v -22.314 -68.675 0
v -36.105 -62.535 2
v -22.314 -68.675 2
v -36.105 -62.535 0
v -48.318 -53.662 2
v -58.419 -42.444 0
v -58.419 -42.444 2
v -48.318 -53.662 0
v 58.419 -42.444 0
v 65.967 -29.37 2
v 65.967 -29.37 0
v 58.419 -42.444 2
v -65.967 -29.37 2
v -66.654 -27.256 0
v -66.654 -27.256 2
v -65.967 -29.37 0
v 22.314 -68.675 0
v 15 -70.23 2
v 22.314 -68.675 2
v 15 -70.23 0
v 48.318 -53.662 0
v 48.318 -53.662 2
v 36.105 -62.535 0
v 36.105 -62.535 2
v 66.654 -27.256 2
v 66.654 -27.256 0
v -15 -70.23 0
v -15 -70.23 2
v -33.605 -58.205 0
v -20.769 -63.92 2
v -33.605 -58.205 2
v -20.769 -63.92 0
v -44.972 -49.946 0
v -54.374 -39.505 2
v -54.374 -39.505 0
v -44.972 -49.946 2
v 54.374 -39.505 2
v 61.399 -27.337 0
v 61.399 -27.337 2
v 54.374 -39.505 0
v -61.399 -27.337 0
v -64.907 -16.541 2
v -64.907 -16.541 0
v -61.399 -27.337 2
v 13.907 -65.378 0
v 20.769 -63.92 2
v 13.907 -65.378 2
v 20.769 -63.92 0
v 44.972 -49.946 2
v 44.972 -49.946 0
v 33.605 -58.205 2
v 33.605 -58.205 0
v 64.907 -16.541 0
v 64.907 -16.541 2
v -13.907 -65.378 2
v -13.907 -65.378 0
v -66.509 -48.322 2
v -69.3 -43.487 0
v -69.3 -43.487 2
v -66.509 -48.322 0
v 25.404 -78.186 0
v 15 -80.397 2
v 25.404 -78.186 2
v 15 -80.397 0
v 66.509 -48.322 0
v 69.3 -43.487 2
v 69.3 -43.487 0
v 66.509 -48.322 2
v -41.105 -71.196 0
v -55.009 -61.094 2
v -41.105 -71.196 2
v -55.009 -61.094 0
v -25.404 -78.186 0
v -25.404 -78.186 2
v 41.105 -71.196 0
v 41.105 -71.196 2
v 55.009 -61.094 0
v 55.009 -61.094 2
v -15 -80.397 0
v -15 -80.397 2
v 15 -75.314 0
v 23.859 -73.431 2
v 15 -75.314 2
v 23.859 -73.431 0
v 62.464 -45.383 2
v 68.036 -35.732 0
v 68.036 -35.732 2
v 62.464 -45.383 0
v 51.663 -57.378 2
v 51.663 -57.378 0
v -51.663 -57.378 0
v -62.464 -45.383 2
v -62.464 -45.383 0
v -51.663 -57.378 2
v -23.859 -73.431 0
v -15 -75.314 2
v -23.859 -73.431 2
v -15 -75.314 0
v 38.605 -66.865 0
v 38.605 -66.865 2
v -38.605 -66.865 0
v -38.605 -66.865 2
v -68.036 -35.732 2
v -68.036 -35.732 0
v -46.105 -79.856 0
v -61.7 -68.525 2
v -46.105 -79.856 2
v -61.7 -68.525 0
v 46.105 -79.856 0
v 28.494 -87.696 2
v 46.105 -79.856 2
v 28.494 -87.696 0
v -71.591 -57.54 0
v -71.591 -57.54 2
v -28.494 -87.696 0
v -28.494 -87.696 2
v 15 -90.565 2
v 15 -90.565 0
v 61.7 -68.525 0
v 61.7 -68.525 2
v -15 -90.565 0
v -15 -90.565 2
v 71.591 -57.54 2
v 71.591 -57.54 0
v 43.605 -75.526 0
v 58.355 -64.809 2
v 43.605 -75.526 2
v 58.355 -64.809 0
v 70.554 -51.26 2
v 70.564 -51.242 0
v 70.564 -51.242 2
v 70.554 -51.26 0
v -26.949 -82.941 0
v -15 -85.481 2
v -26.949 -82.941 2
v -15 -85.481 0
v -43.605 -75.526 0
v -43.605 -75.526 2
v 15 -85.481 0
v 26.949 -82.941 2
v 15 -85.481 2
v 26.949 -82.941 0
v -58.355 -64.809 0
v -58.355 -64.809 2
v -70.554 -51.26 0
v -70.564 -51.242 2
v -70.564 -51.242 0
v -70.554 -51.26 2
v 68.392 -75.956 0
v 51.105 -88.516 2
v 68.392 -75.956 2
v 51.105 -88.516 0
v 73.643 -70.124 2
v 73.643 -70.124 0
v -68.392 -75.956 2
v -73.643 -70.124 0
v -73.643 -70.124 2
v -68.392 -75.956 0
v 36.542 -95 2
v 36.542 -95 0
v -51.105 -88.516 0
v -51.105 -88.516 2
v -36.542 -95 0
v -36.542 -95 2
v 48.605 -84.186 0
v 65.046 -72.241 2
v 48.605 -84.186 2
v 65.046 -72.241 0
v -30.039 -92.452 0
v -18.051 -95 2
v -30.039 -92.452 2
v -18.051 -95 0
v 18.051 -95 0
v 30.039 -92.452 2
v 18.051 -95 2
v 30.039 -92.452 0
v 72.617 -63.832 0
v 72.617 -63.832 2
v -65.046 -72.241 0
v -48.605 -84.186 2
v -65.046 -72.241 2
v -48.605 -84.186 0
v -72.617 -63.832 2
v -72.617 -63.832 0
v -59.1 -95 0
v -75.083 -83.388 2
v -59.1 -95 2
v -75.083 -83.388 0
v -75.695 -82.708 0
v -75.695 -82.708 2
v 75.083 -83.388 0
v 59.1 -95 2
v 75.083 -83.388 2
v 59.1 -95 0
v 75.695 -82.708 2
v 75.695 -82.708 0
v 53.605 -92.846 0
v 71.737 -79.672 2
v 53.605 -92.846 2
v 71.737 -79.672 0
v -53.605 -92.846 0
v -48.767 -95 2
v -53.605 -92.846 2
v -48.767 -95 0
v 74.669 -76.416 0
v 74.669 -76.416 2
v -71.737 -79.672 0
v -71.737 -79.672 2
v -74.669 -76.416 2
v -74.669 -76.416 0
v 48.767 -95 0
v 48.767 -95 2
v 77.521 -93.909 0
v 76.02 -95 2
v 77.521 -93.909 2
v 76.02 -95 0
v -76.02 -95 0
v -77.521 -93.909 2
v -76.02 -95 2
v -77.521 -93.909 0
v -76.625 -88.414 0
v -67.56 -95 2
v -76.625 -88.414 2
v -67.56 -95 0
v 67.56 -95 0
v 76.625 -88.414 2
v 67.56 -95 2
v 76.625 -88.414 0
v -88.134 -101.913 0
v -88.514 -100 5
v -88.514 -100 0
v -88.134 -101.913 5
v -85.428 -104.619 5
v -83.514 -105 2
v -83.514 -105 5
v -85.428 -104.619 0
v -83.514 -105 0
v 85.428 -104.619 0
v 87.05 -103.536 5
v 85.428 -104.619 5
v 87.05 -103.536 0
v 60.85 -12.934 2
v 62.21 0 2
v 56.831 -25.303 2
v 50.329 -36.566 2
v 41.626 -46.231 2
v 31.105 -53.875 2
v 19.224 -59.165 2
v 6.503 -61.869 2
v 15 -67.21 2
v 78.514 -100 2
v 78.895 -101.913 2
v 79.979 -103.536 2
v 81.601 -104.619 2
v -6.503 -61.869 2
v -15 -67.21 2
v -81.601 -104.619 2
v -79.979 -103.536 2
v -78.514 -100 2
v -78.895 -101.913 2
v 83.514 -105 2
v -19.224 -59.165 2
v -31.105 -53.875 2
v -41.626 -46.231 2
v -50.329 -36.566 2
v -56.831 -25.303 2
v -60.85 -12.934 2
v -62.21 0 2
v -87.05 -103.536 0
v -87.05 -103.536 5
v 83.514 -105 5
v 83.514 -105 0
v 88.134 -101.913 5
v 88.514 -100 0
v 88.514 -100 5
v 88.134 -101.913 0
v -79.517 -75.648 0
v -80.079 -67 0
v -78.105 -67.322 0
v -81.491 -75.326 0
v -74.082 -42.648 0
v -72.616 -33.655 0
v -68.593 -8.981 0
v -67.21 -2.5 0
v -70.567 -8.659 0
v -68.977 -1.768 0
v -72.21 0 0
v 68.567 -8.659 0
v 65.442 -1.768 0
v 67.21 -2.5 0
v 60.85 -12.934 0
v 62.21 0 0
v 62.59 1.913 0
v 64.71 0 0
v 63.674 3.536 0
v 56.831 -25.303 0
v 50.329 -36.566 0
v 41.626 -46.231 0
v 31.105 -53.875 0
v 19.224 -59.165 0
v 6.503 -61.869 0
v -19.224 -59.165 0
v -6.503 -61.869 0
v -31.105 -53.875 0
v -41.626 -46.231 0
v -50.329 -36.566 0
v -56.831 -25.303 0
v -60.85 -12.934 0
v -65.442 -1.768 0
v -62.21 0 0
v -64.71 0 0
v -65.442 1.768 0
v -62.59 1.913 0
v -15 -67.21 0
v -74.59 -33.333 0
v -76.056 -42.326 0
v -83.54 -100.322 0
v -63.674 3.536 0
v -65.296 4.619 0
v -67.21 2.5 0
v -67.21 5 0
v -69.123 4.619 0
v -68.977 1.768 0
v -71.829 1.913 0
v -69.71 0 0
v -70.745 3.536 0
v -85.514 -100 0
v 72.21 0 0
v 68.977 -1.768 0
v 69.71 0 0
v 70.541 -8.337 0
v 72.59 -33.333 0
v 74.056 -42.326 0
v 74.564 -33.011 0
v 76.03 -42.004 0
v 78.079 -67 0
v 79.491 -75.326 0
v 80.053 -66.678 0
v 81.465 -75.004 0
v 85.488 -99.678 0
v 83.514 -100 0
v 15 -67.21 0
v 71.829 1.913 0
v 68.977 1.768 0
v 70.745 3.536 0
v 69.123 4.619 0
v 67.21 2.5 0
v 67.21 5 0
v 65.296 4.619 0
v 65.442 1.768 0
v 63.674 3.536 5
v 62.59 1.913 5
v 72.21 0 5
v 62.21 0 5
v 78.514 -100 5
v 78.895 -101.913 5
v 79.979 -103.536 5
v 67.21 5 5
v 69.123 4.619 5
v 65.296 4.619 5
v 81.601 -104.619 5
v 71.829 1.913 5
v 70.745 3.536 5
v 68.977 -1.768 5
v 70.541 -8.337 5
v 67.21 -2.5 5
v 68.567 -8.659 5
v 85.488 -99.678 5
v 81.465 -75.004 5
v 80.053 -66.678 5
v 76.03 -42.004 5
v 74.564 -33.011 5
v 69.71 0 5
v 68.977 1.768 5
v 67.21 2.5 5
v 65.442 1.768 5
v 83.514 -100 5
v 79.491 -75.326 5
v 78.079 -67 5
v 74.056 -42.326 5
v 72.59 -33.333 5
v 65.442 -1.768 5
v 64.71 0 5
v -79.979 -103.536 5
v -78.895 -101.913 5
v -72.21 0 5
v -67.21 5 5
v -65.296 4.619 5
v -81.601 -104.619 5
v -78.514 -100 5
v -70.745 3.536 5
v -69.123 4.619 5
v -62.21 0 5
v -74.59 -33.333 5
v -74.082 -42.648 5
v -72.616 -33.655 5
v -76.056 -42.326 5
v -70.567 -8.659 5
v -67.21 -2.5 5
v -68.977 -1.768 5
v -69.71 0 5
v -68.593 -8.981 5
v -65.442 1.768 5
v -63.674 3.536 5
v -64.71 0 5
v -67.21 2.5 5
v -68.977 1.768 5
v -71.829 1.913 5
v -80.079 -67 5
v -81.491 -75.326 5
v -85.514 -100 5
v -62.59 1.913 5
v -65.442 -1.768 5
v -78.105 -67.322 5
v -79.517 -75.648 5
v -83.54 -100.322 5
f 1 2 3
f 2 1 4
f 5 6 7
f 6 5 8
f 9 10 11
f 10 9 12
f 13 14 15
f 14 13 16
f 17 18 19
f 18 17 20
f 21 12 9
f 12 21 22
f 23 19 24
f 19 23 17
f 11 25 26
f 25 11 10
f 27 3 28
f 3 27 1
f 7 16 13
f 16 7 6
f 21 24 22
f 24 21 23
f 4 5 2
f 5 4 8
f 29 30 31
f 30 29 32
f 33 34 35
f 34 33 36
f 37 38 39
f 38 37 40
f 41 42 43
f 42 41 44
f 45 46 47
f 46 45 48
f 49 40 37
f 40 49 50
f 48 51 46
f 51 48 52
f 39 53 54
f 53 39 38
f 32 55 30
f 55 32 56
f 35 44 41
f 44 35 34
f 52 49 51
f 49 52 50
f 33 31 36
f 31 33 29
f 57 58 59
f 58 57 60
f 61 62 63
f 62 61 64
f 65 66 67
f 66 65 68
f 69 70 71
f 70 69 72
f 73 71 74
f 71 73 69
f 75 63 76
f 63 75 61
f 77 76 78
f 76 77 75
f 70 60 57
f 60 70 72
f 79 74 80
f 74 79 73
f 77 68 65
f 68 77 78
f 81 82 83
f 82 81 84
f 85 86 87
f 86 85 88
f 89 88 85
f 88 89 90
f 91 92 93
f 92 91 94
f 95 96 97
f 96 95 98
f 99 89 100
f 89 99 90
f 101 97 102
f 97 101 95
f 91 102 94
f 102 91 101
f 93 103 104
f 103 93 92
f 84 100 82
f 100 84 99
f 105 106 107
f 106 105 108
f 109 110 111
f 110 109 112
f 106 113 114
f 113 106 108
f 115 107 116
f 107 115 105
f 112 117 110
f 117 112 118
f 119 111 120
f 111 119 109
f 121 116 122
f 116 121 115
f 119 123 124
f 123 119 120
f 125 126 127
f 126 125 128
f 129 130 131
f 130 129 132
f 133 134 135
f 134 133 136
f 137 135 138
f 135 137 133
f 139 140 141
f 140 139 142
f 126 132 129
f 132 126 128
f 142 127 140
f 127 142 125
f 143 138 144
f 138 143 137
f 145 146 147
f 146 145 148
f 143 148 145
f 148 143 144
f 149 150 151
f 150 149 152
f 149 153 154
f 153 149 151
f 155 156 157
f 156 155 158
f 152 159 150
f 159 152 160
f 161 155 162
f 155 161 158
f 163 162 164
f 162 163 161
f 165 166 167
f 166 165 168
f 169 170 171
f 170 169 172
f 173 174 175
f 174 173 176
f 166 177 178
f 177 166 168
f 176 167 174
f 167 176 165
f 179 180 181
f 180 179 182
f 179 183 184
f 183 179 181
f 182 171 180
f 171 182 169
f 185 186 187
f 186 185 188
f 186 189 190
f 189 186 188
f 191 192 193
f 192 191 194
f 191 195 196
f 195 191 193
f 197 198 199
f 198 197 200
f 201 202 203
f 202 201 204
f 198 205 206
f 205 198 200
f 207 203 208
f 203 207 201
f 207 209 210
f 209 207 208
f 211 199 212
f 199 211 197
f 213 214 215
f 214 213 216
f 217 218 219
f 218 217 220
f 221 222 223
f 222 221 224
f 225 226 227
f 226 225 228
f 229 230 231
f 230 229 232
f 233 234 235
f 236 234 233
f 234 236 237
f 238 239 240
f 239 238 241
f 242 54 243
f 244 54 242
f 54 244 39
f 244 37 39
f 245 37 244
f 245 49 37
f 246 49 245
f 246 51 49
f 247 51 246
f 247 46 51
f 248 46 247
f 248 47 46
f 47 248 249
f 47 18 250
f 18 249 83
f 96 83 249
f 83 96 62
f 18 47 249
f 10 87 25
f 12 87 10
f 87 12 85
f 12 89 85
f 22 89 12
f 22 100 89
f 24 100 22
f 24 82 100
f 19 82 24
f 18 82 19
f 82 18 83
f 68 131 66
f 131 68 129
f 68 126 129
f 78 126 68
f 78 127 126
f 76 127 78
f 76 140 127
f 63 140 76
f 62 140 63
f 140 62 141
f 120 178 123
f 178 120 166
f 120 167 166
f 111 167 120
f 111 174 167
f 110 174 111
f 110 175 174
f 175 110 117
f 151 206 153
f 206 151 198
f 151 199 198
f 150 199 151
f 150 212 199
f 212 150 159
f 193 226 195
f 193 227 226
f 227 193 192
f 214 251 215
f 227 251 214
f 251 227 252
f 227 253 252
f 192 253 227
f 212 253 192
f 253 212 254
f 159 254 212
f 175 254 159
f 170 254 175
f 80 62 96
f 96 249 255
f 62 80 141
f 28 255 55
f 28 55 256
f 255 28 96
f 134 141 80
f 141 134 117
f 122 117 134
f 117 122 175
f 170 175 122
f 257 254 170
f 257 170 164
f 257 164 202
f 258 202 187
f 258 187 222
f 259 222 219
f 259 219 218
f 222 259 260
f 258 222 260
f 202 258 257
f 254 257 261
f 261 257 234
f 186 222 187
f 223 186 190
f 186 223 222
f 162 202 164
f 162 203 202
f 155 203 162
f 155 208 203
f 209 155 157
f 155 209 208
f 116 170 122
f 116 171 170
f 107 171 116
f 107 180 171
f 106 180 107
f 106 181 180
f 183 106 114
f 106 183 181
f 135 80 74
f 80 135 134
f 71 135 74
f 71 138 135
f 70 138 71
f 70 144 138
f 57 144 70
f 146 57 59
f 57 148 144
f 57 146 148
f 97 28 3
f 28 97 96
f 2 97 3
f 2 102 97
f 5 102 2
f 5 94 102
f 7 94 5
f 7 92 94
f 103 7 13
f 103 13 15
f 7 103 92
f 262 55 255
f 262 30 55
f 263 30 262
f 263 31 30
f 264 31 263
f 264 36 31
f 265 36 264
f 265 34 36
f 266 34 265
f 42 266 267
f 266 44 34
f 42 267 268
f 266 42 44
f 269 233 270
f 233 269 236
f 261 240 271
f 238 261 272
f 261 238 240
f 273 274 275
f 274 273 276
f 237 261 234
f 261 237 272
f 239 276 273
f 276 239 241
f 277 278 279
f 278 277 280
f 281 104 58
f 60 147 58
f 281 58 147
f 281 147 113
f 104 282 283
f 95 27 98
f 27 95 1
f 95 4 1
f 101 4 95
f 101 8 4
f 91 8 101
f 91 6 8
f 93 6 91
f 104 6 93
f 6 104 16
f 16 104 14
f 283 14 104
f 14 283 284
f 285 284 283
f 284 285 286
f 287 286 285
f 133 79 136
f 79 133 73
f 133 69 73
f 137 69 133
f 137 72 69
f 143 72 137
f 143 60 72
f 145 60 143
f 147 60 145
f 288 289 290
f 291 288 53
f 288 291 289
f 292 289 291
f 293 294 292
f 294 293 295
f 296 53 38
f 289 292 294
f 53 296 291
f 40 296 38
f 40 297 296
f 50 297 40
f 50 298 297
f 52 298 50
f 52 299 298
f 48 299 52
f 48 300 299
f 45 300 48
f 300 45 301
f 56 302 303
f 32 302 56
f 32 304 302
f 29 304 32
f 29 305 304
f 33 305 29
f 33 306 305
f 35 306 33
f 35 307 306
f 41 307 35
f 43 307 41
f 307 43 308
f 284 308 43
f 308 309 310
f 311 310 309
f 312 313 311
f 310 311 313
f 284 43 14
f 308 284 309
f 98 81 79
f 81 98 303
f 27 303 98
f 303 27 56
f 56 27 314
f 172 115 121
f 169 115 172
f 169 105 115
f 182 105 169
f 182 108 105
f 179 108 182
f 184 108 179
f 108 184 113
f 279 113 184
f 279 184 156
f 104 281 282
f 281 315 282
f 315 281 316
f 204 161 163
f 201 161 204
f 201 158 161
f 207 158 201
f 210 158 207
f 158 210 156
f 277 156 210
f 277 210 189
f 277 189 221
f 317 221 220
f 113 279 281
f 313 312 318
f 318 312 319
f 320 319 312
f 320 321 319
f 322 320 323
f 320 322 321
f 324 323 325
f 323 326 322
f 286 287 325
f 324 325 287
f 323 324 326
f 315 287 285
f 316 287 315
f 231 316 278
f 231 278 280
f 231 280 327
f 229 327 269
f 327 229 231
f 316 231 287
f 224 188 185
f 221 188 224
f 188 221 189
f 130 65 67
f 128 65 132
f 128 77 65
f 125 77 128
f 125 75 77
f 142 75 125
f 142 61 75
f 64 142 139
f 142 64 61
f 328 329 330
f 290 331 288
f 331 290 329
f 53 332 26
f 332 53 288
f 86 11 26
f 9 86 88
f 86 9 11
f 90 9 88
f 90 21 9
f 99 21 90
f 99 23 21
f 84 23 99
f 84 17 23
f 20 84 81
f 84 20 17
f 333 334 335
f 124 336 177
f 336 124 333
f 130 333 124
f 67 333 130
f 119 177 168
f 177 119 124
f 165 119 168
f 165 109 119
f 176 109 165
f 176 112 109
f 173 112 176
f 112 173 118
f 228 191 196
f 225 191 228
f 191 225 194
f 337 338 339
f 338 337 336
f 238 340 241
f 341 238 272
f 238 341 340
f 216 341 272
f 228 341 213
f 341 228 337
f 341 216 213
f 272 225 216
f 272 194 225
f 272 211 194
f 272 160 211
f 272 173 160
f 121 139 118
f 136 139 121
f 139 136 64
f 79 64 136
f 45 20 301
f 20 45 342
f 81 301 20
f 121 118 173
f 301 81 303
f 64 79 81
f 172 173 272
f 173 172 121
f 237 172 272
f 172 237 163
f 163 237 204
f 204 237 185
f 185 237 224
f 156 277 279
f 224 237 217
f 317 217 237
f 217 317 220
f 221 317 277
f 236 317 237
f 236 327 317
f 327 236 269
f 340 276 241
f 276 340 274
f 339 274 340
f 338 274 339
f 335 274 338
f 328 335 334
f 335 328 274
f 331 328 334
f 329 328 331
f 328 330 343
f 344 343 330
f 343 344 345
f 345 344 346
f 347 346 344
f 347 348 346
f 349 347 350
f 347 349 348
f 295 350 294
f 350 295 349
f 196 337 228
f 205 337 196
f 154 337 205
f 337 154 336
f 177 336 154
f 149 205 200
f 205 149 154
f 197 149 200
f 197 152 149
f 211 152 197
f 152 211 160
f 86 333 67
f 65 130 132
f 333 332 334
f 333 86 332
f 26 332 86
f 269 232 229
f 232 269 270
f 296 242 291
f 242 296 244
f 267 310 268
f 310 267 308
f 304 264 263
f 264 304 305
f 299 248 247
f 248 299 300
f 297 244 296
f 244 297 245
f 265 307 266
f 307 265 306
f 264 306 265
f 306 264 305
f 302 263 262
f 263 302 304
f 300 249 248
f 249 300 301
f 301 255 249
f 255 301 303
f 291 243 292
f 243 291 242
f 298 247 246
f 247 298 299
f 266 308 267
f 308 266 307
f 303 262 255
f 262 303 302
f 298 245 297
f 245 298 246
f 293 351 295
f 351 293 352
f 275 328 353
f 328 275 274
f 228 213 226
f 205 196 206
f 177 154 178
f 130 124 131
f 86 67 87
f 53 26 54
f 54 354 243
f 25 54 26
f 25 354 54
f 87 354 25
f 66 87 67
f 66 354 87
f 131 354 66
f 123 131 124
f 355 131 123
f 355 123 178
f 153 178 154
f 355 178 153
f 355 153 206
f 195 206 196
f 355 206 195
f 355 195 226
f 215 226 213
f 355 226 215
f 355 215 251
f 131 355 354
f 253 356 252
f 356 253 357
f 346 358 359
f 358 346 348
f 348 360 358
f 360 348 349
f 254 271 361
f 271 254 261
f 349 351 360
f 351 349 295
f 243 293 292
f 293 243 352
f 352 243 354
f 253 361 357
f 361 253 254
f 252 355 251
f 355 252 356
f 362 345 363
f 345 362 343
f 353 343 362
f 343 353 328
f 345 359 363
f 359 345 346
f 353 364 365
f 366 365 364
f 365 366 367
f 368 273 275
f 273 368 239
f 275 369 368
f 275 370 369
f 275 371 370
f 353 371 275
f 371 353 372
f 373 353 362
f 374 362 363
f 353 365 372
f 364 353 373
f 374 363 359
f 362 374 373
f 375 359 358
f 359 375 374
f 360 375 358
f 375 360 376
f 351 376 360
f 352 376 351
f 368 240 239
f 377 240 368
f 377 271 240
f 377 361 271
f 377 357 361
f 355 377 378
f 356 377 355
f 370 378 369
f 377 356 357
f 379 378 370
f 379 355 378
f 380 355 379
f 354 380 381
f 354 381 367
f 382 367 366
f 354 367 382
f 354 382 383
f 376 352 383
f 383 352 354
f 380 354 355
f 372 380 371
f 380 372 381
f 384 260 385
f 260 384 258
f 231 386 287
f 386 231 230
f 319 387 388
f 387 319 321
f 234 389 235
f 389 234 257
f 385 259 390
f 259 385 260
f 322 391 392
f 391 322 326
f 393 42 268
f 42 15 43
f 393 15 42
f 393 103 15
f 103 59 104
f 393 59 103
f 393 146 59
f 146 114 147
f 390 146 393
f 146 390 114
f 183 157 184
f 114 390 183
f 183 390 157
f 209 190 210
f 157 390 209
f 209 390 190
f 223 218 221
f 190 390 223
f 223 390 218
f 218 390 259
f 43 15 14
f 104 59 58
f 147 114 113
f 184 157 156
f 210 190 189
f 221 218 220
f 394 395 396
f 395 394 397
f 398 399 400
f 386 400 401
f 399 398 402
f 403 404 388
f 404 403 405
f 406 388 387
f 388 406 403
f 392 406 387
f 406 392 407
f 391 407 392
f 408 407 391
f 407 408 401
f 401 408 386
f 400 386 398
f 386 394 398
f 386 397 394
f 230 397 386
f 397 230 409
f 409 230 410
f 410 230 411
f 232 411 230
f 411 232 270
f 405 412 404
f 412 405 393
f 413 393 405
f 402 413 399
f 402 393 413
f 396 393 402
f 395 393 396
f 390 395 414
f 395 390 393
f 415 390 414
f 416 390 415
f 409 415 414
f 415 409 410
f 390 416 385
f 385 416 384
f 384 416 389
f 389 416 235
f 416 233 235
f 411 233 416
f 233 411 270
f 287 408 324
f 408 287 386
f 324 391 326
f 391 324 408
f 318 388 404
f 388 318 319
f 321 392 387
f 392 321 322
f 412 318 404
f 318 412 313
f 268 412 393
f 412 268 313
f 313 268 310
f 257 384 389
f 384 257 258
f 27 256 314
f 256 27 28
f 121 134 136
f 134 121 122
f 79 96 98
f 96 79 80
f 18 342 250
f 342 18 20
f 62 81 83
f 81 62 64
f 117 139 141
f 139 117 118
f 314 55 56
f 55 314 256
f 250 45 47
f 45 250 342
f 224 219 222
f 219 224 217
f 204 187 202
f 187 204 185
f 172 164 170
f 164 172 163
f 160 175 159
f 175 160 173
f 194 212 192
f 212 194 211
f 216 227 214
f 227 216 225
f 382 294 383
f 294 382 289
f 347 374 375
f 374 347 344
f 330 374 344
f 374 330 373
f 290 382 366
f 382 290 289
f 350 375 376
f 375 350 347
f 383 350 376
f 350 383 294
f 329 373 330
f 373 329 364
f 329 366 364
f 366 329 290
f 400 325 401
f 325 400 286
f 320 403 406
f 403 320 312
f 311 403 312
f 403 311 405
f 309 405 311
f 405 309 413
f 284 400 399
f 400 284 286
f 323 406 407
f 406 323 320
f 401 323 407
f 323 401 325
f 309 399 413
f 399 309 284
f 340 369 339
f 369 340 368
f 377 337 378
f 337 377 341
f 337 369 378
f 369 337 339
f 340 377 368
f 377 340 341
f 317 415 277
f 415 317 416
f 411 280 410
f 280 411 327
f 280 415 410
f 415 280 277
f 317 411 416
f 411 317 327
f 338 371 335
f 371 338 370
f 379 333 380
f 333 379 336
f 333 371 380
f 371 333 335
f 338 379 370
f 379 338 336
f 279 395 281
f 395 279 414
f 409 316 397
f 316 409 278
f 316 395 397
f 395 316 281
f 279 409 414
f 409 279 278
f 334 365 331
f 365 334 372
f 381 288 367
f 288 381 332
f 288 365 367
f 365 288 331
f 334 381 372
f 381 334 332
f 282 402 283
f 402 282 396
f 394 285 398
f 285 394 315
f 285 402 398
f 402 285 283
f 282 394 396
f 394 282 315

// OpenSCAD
/* [Measurements] */
// See Measurement Guide at:
// https://docs.google.com/a/popk.in/document/d/1LX3tBpio-6IsMMo3aaUdR-mLwWdv1jS4ooeEHb79JYo for details.
// The default values are the ones from the photo in that document.

// e-NABLE measurement 5, Wrist Joint distance from lateral to medial side
wrist = 35.97;
// Length of gauntlet, e.g. half distance from elbow to wrist.
len = 100;
// Distance between lateral and medial side of the middle forearm (end of gauntlet closest to elbow)
width = 46.35;
// height of side rail
rail = 10; 
// thickness of side rails
thick=5; 
// thickness of rest of gauntlet
thin=2; 
// thickness of padding
padding = 5;
// spacing of bars
spacing = 10;
// thickness of bars
bar=5;
// diameter of bolt for wrist pivot
bolt = 5;
// Length of slots
slotLen = 25;
// Height of slots
slotH = 2;

/* [hidden] */

pi=3.1415926;

wristX = (wrist+2*padding)*pi/2-rail/2;
wideX = (width+2*padding)*pi/2-rail/2;

diff = wideX-wristX;
angle = atan(diff/len);
echo(diff,angle);

echo(len, wristX, wideX);

difference() {
union() {
difference() {
	union() {
		hull() {
			translate([wristX,0]) cylinder(d=rail, h=thick);
			translate([wideX,-len]) cylinder(d=rail, h=thick);
			}
		hull() {
			translate([-wristX,0]) cylinder(d=rail, h=thick);
			translate([-wideX,-len]) cylinder(d=rail, h=thick);
			}
		scale([3,1,1])hull() {
			translate([0,-(wristX)]) cylinder(d=rail, h=thin);
			translate([0,-len]) cylinder(d=rail, h=thin);
			}
		difference() {
			hull() {
				translate([wristX,-bar]) cylinder(d=rail, h=thin);
				translate([wideX,-len]) cylinder(d=rail, h=thin);
				translate([-wristX,-bar]) cylinder(d=rail, h=thin);
				translate([-wideX,-len]) cylinder(d=rail, h=thin);
				}
			translate([0,0,-1]) cylinder(r=wristX-rail/2, h=thick+2);
			translate([0,0,-.5]) for (r=[wristX-rail/2+bar:spacing:len+3*spacing]) {
				core(r,bar,thin+1);
				}
			}
		}
	}

hull() {
	translate([-wideX,-len]) cylinder(d=rail, h=thin);
	translate([wideX,-len]) cylinder(d=rail, h=thin);
	}
}
	translate([wristX,0,-2]) cylinder(d=bolt, h=thick+4);
	translate([-wristX,0,-2]) cylinder(d=bolt, h=thick+4);
	translate([wideX,-len,-1]) rotate([0,0,angle]) cube([2,25,thick+2]);
	translate([-wideX-slotH,-len,-1]) rotate([0,0,-angle]) cube([2,25,thick+2]);
	translate([wideX-diff/3,-len*.67,-1]) rotate([0,0,angle]) cube([slotH,25,thick+2]);
	translate([-wideX+diff/3-slotH,-len*.67,-1]) rotate([0,0,-angle]) cube([slotH,25,thick+2]);
	translate([wideX-diff*.67,-len/3,-1]) rotate([0,0,angle]) cube([slotH,25,thick+2]);
	translate([-wideX+diff*.67-slotH,-len/3,-1]) rotate([0,0,-angle]) cube([slotH,25,thick+2]);

}


module core(r,t,h) {
	difference() {
		cylinder(r=r+t, h=h);
		translate([0,0,-1]) cylinder(r=r, h=h+1);
		}
	}
